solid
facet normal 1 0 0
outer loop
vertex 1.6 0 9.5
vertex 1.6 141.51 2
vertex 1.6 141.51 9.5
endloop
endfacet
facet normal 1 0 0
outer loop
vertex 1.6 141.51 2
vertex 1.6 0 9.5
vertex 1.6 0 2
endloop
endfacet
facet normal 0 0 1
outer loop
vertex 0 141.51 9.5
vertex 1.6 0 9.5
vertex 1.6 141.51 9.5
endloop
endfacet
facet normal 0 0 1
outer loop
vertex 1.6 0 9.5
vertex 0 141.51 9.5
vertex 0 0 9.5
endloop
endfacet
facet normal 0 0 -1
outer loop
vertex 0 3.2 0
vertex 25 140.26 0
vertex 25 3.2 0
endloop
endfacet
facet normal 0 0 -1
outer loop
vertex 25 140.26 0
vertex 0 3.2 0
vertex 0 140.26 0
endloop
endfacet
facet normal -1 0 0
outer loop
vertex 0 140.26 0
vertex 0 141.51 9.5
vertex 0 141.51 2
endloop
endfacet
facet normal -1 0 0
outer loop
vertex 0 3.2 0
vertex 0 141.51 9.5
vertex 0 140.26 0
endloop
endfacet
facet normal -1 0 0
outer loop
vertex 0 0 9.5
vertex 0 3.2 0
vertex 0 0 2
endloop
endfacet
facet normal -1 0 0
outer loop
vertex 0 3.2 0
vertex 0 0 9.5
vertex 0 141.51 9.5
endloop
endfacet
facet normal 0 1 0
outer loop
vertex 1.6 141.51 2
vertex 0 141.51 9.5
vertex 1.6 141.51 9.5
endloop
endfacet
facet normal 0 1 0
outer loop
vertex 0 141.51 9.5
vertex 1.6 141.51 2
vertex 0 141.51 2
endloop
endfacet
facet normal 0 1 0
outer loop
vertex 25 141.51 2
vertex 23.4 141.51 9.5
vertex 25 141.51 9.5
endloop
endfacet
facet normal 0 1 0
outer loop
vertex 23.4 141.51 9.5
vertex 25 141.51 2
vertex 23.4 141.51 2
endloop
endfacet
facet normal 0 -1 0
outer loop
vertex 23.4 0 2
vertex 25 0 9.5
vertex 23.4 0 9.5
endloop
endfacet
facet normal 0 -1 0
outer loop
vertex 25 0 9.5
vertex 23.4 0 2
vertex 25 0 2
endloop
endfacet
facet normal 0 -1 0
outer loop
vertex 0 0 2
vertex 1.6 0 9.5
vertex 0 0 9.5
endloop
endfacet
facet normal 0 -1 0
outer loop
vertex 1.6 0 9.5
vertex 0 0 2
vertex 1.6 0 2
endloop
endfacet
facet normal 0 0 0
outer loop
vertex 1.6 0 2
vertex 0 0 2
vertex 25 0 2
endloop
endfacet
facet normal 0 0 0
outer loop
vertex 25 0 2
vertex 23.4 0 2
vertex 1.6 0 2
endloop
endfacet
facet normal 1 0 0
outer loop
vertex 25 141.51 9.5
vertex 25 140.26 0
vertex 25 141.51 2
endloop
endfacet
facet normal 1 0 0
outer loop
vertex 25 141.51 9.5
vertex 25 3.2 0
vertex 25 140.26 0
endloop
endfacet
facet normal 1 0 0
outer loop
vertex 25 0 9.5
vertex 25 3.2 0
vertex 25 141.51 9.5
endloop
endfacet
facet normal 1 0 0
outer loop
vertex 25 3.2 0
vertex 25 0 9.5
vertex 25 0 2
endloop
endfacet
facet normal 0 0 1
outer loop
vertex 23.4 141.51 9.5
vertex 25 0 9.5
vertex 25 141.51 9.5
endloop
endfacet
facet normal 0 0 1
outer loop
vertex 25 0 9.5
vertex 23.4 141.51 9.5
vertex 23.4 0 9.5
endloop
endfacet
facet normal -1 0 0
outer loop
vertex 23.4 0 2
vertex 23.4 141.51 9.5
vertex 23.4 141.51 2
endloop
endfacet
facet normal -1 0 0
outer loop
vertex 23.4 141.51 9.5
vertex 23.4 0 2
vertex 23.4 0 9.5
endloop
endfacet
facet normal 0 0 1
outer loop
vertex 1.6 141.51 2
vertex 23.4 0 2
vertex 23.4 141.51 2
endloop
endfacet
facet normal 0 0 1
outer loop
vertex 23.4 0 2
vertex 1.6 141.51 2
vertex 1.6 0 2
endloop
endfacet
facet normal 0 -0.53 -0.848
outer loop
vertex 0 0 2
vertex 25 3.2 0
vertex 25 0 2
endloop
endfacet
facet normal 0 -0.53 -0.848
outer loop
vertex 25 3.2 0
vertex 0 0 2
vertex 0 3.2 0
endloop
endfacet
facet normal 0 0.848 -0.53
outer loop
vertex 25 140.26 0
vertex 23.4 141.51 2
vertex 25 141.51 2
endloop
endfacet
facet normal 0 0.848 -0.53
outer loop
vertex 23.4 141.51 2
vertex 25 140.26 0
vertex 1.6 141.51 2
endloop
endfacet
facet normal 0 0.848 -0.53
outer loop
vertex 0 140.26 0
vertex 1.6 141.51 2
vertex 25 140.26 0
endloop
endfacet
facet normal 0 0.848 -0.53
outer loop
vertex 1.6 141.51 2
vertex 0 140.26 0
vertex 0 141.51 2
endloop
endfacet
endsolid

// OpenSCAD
include <_climbing_frame.scad>

// Print once.
scale(s) slide_print();
